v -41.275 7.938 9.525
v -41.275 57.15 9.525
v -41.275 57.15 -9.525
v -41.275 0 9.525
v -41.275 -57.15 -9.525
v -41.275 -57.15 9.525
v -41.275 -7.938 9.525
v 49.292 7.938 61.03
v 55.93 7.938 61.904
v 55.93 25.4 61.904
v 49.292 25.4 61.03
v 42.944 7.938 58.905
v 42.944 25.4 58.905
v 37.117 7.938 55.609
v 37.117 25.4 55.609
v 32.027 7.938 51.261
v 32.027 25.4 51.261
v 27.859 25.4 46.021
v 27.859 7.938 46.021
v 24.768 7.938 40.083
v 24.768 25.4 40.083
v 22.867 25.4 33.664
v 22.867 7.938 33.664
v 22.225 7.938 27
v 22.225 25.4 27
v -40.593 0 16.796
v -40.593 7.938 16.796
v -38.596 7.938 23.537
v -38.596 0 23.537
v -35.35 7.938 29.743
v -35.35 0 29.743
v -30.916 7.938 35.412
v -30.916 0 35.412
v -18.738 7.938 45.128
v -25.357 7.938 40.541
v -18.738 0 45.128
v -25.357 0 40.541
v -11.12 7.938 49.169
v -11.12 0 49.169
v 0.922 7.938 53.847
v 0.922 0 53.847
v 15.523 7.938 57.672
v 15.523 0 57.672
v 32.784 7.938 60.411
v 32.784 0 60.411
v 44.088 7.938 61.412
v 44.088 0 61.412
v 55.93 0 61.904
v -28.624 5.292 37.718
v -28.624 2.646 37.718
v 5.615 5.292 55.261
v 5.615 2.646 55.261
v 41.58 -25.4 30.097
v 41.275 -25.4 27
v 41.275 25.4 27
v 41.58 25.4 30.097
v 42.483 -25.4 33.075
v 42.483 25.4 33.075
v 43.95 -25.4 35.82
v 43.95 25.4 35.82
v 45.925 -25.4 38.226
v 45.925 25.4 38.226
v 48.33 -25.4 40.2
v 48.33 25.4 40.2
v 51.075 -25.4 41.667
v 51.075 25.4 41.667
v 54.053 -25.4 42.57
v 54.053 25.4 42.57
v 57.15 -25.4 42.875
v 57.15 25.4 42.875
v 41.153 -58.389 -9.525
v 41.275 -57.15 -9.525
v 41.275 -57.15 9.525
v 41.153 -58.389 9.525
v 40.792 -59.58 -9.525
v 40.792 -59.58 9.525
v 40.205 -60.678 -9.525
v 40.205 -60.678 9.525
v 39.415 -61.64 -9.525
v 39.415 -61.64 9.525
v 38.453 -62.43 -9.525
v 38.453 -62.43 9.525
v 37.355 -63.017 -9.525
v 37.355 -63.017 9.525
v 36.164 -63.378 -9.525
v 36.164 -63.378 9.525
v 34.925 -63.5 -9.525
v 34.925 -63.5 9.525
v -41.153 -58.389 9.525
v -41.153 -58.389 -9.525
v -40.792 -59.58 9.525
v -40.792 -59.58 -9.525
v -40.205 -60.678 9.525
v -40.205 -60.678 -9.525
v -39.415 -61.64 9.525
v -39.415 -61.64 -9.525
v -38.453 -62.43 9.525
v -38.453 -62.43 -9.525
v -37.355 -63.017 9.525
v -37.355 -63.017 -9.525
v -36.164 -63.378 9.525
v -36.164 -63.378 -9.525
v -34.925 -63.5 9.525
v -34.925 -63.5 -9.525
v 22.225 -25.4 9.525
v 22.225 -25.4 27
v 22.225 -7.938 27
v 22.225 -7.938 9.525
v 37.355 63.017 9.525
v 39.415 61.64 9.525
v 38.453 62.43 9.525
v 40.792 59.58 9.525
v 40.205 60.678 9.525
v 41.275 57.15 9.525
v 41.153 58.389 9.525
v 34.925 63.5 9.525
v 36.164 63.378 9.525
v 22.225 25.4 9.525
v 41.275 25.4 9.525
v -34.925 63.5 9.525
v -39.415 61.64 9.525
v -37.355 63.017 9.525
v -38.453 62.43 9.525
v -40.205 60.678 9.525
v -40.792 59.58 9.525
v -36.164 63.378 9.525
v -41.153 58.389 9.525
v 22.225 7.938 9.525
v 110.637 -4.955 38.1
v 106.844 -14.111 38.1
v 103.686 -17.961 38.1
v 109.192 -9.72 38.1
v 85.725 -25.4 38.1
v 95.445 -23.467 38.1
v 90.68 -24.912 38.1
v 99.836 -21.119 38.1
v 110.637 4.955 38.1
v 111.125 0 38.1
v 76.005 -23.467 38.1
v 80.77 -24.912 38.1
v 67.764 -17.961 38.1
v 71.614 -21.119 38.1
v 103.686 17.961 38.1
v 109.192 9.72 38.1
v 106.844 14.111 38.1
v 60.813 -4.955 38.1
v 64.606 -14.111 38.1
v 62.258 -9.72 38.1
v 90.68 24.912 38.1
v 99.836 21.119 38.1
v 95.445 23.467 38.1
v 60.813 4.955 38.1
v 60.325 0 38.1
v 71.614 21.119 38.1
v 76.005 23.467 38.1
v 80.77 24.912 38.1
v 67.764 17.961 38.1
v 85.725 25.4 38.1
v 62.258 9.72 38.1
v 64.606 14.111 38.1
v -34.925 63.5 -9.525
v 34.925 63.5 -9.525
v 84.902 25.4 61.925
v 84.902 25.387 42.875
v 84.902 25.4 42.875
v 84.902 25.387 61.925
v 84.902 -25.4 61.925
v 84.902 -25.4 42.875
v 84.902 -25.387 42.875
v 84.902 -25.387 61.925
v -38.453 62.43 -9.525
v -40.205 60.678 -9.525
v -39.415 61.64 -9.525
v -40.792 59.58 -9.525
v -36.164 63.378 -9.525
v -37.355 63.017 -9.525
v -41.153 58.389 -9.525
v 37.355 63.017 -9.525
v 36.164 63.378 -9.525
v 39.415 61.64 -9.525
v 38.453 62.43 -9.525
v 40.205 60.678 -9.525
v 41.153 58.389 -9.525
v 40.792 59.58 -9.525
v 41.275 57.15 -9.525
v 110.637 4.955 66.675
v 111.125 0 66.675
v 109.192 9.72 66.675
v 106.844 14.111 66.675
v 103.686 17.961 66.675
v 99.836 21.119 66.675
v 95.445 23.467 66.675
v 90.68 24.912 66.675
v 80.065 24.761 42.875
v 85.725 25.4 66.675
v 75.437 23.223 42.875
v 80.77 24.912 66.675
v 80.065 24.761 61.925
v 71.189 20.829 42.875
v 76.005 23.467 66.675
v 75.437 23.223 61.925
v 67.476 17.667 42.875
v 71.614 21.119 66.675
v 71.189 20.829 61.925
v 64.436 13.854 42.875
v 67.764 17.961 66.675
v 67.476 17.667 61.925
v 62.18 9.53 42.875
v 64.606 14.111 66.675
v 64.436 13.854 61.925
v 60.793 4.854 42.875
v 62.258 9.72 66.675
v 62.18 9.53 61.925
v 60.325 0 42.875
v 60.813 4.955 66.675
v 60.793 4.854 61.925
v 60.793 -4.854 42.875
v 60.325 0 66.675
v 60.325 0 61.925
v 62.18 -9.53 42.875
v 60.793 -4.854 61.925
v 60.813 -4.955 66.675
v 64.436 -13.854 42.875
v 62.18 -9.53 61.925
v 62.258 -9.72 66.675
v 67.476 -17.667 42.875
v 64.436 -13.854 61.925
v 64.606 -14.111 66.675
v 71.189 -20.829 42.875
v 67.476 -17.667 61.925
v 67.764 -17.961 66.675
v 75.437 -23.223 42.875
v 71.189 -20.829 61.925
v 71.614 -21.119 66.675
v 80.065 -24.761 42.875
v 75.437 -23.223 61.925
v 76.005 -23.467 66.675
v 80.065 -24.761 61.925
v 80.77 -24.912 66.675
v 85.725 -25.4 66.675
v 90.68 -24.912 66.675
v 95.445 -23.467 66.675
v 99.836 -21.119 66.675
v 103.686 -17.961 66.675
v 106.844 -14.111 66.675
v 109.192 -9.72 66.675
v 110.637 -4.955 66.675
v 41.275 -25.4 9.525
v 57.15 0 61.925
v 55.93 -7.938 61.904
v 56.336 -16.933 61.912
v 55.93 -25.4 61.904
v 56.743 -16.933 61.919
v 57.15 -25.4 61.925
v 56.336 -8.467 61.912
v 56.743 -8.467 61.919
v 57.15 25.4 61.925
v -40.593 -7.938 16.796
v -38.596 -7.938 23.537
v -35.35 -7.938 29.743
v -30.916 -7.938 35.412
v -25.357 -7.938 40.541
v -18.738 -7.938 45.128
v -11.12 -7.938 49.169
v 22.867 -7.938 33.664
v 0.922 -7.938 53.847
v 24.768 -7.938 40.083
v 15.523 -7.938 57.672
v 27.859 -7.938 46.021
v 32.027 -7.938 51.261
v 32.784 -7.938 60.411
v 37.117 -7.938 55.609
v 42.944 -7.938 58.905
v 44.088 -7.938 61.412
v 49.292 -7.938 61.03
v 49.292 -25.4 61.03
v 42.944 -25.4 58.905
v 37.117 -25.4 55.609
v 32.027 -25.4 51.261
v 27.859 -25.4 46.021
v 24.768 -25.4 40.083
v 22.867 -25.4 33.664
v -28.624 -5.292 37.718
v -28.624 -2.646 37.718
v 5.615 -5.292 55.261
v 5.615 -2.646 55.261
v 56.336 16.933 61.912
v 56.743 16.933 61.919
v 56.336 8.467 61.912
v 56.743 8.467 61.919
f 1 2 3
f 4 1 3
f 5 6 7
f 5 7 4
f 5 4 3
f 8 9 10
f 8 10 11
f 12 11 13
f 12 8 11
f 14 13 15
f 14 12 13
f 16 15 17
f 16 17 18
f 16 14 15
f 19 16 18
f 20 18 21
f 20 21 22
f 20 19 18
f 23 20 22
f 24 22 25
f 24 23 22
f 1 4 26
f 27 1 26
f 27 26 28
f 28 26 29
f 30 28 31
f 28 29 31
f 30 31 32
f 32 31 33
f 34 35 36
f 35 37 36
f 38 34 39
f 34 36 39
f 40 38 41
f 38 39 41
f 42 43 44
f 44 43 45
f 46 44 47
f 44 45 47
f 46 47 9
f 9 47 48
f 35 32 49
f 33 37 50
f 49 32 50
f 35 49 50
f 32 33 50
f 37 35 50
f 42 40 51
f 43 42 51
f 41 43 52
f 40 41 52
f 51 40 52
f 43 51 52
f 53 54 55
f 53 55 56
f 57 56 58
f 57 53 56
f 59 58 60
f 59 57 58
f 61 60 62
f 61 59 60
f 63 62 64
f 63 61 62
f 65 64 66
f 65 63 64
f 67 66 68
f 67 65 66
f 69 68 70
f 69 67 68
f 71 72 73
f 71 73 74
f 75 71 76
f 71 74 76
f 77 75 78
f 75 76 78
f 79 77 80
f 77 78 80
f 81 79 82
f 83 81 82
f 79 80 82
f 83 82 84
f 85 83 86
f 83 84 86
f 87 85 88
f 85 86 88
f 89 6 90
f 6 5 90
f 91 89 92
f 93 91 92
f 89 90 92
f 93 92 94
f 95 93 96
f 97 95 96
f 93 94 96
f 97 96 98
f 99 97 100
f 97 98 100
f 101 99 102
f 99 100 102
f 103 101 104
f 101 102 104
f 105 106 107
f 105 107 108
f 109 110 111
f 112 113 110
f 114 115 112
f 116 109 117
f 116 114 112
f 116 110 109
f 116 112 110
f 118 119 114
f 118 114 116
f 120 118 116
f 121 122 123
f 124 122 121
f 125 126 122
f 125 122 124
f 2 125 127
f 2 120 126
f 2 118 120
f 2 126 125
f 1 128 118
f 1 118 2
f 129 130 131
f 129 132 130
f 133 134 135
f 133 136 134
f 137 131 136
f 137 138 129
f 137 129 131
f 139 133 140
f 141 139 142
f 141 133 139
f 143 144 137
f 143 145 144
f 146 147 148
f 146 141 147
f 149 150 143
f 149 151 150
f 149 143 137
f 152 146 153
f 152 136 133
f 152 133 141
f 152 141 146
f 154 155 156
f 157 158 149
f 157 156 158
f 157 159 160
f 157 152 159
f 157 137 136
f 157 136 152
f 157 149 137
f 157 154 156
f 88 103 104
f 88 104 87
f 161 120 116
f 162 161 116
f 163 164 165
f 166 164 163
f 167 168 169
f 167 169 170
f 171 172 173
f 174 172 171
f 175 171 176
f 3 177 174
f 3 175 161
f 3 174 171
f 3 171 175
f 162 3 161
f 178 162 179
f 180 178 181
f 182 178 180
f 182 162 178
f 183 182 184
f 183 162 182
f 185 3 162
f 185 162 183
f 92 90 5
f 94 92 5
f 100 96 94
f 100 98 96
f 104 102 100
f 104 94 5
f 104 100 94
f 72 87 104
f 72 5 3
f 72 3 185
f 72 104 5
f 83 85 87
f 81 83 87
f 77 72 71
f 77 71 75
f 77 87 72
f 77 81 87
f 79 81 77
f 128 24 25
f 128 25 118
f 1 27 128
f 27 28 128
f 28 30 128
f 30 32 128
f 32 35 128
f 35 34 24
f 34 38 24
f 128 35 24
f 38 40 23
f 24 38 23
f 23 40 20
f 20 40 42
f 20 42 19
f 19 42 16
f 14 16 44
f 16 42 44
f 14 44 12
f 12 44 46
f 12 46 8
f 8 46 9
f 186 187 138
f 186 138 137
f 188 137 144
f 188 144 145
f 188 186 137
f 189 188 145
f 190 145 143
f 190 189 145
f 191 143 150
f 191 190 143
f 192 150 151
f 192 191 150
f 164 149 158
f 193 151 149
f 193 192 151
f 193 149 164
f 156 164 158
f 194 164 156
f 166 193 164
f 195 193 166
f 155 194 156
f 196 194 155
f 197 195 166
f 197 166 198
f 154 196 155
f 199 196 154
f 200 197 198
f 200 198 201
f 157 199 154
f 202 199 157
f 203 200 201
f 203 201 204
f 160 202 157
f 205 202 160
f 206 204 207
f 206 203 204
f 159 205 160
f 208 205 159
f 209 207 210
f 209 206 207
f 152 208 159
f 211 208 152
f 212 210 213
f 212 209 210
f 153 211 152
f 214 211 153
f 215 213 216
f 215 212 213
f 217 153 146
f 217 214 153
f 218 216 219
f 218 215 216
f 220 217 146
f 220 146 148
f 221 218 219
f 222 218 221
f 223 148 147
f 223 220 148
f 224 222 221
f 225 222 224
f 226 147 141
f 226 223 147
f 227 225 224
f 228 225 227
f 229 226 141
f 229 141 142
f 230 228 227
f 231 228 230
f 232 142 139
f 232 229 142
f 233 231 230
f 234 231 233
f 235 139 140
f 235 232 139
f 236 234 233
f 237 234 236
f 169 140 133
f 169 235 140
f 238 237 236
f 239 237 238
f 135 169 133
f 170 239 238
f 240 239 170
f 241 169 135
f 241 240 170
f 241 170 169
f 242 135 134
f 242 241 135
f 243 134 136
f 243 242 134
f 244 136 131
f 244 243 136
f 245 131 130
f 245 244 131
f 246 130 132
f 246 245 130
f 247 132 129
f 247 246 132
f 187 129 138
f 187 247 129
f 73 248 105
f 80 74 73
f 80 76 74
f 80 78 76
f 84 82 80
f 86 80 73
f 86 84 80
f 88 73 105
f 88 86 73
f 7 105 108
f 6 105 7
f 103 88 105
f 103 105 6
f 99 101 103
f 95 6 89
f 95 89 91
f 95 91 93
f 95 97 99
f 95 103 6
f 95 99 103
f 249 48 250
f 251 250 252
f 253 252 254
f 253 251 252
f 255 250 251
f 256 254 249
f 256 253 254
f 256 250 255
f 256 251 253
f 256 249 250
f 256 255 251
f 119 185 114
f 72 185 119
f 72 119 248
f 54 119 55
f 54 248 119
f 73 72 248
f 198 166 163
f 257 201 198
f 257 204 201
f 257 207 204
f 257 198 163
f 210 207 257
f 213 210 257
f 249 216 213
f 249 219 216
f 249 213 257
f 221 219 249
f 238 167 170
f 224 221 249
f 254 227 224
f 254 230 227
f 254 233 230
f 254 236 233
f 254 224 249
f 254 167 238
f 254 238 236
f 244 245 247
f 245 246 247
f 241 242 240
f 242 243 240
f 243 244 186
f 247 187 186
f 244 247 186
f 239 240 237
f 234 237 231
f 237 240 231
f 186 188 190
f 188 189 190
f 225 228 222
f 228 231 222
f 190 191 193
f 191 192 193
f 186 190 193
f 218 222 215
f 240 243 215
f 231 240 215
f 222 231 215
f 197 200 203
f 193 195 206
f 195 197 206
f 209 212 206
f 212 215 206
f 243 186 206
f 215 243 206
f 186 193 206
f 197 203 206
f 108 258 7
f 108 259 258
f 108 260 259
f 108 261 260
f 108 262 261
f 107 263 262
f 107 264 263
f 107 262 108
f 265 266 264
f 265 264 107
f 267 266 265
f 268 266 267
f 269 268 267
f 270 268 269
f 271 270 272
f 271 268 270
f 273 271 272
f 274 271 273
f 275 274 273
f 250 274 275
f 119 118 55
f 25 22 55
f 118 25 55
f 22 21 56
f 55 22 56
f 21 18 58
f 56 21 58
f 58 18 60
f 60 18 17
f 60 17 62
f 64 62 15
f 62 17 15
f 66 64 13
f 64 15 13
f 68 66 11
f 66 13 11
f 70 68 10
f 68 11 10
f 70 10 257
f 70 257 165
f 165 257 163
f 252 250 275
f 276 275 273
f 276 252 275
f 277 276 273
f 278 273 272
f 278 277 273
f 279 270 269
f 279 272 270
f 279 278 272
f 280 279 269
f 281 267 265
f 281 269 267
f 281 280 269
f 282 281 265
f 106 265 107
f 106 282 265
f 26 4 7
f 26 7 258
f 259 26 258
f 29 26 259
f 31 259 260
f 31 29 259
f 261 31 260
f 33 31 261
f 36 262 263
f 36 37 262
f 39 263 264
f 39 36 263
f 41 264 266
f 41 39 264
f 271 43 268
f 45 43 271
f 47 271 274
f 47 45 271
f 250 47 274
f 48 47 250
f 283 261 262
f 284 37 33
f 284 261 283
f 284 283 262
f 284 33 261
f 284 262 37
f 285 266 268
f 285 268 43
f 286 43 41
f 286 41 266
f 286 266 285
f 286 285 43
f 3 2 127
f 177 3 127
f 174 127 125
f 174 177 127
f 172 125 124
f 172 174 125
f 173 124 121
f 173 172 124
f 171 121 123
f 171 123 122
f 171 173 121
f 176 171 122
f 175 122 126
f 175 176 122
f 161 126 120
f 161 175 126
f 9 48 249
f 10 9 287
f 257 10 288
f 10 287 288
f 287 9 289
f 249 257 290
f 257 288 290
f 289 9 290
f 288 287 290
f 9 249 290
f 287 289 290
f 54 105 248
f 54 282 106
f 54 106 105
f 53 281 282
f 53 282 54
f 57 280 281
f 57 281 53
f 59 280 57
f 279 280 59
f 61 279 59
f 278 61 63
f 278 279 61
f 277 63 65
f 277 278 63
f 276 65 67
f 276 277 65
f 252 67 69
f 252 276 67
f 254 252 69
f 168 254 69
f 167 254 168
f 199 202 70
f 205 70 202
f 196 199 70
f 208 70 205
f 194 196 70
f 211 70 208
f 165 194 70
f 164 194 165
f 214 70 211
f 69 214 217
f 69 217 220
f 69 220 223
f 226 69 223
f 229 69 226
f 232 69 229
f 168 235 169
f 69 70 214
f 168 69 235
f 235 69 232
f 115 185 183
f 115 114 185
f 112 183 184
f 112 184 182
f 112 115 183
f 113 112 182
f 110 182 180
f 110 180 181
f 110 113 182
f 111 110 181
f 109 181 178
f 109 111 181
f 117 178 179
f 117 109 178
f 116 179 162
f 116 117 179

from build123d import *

# Parameters (mm, degrees)
F1_DEPTH = 63.5
F0_W     = 24.577054
F0_H     = 19.05
F2_DEPTH = 25.4
F3_DEPTH = 7.9375
F0_W_2   = 25.4
F0_H_2   = 28.575
F5_R     = 6.35


with BuildPart() as f1:
    # F0 (on Front) → F1 (new body, symmetric)
    with BuildSketch(Plane.XZ):
        Polygon((41.275, -9.525), (41.275, 9.525), (22.225, 9.525), (-41.275, 9.525), (-41.275, -9.525), align=None)
    extrude(amount=F1_DEPTH, both=True)

    # F0 (on Front) → F2 (join, symmetric)
    with BuildSketch(Plane.XZ):
        with BuildLine():
            Line((22.225, 9.525), (41.275, 9.525))
            Line((41.275, 9.525), (41.275, 27.0002))
            ThreePointArc((41.275, 27.0002), (45.92468, 38.22552), (57.15, 42.8752))
            Line((57.15, 42.8752), (60.325, 42.8752))
            Line((60.325, 42.8752), (60.325, 61.9252))
            Line((60.325, 61.9252), (57.15, 61.9252))
            add(Edge.make_bspline(
                [(55.929647, 61.903873), (56.335616, 61.911845), (56.742404, 61.918954), (57.15, 61.9252)],
                knots=[110.709281, 110.709281, 110.709281, 110.709281, 111.504536, 111.504536, 111.504536, 111.504536], degree=3))
            ThreePointArc((55.929647, 61.903873), (32.02654, 51.260608), (22.225, 27.0002))
            Line((22.225, 27.0002), (22.225, 9.525))
        make_face()
        with Locations((72.613527, 52.4002)):
            Rectangle(F0_W, F0_H)
    extrude(amount=F2_DEPTH, both=True)

    # F0 (on Front) → F3 (join, symmetric)
    with BuildSketch(Plane.XZ):
        with BuildLine():
            Line((-41.275, 9.525), (22.225, 9.525))
            Line((22.225, 9.525), (22.225, 27.0002))
            ThreePointArc((22.225, 27.0002), (32.02654, 51.260608), (55.929647, 61.903873))
            add(Edge.make_bspline(
                [(-41.275, 9.525), (-41.25457, 42.958838), (-0.586359, 60.794032), (55.929647, 61.903873)],
                knots=[0, 0, 0, 0, 110.709281, 110.709281, 110.709281, 110.709281], degree=3))
        make_face()
    extrude(amount=F3_DEPTH, both=True)

    # F0 (on Front) → F4 (revolve)
    with BuildSketch(Plane.XZ):
        with Locations((98.425, 52.3875)):
            Rectangle(F0_W_2, F0_H_2)
    revolve(axis=Axis((85.725, 0, 52.3875), (0, 0, 1)))

    # F5
    f5_edges = [f1.edges().sort_by_distance(p)[0] for p in [
        (-41.275, -63.5, 0),
        (41.275, -63.5, 0),
        (41.275, 63.5, 0),
        (-41.275, 63.5, 0),
    ]]
    fillet(f5_edges, radius=F5_R)


solid = f1.part
